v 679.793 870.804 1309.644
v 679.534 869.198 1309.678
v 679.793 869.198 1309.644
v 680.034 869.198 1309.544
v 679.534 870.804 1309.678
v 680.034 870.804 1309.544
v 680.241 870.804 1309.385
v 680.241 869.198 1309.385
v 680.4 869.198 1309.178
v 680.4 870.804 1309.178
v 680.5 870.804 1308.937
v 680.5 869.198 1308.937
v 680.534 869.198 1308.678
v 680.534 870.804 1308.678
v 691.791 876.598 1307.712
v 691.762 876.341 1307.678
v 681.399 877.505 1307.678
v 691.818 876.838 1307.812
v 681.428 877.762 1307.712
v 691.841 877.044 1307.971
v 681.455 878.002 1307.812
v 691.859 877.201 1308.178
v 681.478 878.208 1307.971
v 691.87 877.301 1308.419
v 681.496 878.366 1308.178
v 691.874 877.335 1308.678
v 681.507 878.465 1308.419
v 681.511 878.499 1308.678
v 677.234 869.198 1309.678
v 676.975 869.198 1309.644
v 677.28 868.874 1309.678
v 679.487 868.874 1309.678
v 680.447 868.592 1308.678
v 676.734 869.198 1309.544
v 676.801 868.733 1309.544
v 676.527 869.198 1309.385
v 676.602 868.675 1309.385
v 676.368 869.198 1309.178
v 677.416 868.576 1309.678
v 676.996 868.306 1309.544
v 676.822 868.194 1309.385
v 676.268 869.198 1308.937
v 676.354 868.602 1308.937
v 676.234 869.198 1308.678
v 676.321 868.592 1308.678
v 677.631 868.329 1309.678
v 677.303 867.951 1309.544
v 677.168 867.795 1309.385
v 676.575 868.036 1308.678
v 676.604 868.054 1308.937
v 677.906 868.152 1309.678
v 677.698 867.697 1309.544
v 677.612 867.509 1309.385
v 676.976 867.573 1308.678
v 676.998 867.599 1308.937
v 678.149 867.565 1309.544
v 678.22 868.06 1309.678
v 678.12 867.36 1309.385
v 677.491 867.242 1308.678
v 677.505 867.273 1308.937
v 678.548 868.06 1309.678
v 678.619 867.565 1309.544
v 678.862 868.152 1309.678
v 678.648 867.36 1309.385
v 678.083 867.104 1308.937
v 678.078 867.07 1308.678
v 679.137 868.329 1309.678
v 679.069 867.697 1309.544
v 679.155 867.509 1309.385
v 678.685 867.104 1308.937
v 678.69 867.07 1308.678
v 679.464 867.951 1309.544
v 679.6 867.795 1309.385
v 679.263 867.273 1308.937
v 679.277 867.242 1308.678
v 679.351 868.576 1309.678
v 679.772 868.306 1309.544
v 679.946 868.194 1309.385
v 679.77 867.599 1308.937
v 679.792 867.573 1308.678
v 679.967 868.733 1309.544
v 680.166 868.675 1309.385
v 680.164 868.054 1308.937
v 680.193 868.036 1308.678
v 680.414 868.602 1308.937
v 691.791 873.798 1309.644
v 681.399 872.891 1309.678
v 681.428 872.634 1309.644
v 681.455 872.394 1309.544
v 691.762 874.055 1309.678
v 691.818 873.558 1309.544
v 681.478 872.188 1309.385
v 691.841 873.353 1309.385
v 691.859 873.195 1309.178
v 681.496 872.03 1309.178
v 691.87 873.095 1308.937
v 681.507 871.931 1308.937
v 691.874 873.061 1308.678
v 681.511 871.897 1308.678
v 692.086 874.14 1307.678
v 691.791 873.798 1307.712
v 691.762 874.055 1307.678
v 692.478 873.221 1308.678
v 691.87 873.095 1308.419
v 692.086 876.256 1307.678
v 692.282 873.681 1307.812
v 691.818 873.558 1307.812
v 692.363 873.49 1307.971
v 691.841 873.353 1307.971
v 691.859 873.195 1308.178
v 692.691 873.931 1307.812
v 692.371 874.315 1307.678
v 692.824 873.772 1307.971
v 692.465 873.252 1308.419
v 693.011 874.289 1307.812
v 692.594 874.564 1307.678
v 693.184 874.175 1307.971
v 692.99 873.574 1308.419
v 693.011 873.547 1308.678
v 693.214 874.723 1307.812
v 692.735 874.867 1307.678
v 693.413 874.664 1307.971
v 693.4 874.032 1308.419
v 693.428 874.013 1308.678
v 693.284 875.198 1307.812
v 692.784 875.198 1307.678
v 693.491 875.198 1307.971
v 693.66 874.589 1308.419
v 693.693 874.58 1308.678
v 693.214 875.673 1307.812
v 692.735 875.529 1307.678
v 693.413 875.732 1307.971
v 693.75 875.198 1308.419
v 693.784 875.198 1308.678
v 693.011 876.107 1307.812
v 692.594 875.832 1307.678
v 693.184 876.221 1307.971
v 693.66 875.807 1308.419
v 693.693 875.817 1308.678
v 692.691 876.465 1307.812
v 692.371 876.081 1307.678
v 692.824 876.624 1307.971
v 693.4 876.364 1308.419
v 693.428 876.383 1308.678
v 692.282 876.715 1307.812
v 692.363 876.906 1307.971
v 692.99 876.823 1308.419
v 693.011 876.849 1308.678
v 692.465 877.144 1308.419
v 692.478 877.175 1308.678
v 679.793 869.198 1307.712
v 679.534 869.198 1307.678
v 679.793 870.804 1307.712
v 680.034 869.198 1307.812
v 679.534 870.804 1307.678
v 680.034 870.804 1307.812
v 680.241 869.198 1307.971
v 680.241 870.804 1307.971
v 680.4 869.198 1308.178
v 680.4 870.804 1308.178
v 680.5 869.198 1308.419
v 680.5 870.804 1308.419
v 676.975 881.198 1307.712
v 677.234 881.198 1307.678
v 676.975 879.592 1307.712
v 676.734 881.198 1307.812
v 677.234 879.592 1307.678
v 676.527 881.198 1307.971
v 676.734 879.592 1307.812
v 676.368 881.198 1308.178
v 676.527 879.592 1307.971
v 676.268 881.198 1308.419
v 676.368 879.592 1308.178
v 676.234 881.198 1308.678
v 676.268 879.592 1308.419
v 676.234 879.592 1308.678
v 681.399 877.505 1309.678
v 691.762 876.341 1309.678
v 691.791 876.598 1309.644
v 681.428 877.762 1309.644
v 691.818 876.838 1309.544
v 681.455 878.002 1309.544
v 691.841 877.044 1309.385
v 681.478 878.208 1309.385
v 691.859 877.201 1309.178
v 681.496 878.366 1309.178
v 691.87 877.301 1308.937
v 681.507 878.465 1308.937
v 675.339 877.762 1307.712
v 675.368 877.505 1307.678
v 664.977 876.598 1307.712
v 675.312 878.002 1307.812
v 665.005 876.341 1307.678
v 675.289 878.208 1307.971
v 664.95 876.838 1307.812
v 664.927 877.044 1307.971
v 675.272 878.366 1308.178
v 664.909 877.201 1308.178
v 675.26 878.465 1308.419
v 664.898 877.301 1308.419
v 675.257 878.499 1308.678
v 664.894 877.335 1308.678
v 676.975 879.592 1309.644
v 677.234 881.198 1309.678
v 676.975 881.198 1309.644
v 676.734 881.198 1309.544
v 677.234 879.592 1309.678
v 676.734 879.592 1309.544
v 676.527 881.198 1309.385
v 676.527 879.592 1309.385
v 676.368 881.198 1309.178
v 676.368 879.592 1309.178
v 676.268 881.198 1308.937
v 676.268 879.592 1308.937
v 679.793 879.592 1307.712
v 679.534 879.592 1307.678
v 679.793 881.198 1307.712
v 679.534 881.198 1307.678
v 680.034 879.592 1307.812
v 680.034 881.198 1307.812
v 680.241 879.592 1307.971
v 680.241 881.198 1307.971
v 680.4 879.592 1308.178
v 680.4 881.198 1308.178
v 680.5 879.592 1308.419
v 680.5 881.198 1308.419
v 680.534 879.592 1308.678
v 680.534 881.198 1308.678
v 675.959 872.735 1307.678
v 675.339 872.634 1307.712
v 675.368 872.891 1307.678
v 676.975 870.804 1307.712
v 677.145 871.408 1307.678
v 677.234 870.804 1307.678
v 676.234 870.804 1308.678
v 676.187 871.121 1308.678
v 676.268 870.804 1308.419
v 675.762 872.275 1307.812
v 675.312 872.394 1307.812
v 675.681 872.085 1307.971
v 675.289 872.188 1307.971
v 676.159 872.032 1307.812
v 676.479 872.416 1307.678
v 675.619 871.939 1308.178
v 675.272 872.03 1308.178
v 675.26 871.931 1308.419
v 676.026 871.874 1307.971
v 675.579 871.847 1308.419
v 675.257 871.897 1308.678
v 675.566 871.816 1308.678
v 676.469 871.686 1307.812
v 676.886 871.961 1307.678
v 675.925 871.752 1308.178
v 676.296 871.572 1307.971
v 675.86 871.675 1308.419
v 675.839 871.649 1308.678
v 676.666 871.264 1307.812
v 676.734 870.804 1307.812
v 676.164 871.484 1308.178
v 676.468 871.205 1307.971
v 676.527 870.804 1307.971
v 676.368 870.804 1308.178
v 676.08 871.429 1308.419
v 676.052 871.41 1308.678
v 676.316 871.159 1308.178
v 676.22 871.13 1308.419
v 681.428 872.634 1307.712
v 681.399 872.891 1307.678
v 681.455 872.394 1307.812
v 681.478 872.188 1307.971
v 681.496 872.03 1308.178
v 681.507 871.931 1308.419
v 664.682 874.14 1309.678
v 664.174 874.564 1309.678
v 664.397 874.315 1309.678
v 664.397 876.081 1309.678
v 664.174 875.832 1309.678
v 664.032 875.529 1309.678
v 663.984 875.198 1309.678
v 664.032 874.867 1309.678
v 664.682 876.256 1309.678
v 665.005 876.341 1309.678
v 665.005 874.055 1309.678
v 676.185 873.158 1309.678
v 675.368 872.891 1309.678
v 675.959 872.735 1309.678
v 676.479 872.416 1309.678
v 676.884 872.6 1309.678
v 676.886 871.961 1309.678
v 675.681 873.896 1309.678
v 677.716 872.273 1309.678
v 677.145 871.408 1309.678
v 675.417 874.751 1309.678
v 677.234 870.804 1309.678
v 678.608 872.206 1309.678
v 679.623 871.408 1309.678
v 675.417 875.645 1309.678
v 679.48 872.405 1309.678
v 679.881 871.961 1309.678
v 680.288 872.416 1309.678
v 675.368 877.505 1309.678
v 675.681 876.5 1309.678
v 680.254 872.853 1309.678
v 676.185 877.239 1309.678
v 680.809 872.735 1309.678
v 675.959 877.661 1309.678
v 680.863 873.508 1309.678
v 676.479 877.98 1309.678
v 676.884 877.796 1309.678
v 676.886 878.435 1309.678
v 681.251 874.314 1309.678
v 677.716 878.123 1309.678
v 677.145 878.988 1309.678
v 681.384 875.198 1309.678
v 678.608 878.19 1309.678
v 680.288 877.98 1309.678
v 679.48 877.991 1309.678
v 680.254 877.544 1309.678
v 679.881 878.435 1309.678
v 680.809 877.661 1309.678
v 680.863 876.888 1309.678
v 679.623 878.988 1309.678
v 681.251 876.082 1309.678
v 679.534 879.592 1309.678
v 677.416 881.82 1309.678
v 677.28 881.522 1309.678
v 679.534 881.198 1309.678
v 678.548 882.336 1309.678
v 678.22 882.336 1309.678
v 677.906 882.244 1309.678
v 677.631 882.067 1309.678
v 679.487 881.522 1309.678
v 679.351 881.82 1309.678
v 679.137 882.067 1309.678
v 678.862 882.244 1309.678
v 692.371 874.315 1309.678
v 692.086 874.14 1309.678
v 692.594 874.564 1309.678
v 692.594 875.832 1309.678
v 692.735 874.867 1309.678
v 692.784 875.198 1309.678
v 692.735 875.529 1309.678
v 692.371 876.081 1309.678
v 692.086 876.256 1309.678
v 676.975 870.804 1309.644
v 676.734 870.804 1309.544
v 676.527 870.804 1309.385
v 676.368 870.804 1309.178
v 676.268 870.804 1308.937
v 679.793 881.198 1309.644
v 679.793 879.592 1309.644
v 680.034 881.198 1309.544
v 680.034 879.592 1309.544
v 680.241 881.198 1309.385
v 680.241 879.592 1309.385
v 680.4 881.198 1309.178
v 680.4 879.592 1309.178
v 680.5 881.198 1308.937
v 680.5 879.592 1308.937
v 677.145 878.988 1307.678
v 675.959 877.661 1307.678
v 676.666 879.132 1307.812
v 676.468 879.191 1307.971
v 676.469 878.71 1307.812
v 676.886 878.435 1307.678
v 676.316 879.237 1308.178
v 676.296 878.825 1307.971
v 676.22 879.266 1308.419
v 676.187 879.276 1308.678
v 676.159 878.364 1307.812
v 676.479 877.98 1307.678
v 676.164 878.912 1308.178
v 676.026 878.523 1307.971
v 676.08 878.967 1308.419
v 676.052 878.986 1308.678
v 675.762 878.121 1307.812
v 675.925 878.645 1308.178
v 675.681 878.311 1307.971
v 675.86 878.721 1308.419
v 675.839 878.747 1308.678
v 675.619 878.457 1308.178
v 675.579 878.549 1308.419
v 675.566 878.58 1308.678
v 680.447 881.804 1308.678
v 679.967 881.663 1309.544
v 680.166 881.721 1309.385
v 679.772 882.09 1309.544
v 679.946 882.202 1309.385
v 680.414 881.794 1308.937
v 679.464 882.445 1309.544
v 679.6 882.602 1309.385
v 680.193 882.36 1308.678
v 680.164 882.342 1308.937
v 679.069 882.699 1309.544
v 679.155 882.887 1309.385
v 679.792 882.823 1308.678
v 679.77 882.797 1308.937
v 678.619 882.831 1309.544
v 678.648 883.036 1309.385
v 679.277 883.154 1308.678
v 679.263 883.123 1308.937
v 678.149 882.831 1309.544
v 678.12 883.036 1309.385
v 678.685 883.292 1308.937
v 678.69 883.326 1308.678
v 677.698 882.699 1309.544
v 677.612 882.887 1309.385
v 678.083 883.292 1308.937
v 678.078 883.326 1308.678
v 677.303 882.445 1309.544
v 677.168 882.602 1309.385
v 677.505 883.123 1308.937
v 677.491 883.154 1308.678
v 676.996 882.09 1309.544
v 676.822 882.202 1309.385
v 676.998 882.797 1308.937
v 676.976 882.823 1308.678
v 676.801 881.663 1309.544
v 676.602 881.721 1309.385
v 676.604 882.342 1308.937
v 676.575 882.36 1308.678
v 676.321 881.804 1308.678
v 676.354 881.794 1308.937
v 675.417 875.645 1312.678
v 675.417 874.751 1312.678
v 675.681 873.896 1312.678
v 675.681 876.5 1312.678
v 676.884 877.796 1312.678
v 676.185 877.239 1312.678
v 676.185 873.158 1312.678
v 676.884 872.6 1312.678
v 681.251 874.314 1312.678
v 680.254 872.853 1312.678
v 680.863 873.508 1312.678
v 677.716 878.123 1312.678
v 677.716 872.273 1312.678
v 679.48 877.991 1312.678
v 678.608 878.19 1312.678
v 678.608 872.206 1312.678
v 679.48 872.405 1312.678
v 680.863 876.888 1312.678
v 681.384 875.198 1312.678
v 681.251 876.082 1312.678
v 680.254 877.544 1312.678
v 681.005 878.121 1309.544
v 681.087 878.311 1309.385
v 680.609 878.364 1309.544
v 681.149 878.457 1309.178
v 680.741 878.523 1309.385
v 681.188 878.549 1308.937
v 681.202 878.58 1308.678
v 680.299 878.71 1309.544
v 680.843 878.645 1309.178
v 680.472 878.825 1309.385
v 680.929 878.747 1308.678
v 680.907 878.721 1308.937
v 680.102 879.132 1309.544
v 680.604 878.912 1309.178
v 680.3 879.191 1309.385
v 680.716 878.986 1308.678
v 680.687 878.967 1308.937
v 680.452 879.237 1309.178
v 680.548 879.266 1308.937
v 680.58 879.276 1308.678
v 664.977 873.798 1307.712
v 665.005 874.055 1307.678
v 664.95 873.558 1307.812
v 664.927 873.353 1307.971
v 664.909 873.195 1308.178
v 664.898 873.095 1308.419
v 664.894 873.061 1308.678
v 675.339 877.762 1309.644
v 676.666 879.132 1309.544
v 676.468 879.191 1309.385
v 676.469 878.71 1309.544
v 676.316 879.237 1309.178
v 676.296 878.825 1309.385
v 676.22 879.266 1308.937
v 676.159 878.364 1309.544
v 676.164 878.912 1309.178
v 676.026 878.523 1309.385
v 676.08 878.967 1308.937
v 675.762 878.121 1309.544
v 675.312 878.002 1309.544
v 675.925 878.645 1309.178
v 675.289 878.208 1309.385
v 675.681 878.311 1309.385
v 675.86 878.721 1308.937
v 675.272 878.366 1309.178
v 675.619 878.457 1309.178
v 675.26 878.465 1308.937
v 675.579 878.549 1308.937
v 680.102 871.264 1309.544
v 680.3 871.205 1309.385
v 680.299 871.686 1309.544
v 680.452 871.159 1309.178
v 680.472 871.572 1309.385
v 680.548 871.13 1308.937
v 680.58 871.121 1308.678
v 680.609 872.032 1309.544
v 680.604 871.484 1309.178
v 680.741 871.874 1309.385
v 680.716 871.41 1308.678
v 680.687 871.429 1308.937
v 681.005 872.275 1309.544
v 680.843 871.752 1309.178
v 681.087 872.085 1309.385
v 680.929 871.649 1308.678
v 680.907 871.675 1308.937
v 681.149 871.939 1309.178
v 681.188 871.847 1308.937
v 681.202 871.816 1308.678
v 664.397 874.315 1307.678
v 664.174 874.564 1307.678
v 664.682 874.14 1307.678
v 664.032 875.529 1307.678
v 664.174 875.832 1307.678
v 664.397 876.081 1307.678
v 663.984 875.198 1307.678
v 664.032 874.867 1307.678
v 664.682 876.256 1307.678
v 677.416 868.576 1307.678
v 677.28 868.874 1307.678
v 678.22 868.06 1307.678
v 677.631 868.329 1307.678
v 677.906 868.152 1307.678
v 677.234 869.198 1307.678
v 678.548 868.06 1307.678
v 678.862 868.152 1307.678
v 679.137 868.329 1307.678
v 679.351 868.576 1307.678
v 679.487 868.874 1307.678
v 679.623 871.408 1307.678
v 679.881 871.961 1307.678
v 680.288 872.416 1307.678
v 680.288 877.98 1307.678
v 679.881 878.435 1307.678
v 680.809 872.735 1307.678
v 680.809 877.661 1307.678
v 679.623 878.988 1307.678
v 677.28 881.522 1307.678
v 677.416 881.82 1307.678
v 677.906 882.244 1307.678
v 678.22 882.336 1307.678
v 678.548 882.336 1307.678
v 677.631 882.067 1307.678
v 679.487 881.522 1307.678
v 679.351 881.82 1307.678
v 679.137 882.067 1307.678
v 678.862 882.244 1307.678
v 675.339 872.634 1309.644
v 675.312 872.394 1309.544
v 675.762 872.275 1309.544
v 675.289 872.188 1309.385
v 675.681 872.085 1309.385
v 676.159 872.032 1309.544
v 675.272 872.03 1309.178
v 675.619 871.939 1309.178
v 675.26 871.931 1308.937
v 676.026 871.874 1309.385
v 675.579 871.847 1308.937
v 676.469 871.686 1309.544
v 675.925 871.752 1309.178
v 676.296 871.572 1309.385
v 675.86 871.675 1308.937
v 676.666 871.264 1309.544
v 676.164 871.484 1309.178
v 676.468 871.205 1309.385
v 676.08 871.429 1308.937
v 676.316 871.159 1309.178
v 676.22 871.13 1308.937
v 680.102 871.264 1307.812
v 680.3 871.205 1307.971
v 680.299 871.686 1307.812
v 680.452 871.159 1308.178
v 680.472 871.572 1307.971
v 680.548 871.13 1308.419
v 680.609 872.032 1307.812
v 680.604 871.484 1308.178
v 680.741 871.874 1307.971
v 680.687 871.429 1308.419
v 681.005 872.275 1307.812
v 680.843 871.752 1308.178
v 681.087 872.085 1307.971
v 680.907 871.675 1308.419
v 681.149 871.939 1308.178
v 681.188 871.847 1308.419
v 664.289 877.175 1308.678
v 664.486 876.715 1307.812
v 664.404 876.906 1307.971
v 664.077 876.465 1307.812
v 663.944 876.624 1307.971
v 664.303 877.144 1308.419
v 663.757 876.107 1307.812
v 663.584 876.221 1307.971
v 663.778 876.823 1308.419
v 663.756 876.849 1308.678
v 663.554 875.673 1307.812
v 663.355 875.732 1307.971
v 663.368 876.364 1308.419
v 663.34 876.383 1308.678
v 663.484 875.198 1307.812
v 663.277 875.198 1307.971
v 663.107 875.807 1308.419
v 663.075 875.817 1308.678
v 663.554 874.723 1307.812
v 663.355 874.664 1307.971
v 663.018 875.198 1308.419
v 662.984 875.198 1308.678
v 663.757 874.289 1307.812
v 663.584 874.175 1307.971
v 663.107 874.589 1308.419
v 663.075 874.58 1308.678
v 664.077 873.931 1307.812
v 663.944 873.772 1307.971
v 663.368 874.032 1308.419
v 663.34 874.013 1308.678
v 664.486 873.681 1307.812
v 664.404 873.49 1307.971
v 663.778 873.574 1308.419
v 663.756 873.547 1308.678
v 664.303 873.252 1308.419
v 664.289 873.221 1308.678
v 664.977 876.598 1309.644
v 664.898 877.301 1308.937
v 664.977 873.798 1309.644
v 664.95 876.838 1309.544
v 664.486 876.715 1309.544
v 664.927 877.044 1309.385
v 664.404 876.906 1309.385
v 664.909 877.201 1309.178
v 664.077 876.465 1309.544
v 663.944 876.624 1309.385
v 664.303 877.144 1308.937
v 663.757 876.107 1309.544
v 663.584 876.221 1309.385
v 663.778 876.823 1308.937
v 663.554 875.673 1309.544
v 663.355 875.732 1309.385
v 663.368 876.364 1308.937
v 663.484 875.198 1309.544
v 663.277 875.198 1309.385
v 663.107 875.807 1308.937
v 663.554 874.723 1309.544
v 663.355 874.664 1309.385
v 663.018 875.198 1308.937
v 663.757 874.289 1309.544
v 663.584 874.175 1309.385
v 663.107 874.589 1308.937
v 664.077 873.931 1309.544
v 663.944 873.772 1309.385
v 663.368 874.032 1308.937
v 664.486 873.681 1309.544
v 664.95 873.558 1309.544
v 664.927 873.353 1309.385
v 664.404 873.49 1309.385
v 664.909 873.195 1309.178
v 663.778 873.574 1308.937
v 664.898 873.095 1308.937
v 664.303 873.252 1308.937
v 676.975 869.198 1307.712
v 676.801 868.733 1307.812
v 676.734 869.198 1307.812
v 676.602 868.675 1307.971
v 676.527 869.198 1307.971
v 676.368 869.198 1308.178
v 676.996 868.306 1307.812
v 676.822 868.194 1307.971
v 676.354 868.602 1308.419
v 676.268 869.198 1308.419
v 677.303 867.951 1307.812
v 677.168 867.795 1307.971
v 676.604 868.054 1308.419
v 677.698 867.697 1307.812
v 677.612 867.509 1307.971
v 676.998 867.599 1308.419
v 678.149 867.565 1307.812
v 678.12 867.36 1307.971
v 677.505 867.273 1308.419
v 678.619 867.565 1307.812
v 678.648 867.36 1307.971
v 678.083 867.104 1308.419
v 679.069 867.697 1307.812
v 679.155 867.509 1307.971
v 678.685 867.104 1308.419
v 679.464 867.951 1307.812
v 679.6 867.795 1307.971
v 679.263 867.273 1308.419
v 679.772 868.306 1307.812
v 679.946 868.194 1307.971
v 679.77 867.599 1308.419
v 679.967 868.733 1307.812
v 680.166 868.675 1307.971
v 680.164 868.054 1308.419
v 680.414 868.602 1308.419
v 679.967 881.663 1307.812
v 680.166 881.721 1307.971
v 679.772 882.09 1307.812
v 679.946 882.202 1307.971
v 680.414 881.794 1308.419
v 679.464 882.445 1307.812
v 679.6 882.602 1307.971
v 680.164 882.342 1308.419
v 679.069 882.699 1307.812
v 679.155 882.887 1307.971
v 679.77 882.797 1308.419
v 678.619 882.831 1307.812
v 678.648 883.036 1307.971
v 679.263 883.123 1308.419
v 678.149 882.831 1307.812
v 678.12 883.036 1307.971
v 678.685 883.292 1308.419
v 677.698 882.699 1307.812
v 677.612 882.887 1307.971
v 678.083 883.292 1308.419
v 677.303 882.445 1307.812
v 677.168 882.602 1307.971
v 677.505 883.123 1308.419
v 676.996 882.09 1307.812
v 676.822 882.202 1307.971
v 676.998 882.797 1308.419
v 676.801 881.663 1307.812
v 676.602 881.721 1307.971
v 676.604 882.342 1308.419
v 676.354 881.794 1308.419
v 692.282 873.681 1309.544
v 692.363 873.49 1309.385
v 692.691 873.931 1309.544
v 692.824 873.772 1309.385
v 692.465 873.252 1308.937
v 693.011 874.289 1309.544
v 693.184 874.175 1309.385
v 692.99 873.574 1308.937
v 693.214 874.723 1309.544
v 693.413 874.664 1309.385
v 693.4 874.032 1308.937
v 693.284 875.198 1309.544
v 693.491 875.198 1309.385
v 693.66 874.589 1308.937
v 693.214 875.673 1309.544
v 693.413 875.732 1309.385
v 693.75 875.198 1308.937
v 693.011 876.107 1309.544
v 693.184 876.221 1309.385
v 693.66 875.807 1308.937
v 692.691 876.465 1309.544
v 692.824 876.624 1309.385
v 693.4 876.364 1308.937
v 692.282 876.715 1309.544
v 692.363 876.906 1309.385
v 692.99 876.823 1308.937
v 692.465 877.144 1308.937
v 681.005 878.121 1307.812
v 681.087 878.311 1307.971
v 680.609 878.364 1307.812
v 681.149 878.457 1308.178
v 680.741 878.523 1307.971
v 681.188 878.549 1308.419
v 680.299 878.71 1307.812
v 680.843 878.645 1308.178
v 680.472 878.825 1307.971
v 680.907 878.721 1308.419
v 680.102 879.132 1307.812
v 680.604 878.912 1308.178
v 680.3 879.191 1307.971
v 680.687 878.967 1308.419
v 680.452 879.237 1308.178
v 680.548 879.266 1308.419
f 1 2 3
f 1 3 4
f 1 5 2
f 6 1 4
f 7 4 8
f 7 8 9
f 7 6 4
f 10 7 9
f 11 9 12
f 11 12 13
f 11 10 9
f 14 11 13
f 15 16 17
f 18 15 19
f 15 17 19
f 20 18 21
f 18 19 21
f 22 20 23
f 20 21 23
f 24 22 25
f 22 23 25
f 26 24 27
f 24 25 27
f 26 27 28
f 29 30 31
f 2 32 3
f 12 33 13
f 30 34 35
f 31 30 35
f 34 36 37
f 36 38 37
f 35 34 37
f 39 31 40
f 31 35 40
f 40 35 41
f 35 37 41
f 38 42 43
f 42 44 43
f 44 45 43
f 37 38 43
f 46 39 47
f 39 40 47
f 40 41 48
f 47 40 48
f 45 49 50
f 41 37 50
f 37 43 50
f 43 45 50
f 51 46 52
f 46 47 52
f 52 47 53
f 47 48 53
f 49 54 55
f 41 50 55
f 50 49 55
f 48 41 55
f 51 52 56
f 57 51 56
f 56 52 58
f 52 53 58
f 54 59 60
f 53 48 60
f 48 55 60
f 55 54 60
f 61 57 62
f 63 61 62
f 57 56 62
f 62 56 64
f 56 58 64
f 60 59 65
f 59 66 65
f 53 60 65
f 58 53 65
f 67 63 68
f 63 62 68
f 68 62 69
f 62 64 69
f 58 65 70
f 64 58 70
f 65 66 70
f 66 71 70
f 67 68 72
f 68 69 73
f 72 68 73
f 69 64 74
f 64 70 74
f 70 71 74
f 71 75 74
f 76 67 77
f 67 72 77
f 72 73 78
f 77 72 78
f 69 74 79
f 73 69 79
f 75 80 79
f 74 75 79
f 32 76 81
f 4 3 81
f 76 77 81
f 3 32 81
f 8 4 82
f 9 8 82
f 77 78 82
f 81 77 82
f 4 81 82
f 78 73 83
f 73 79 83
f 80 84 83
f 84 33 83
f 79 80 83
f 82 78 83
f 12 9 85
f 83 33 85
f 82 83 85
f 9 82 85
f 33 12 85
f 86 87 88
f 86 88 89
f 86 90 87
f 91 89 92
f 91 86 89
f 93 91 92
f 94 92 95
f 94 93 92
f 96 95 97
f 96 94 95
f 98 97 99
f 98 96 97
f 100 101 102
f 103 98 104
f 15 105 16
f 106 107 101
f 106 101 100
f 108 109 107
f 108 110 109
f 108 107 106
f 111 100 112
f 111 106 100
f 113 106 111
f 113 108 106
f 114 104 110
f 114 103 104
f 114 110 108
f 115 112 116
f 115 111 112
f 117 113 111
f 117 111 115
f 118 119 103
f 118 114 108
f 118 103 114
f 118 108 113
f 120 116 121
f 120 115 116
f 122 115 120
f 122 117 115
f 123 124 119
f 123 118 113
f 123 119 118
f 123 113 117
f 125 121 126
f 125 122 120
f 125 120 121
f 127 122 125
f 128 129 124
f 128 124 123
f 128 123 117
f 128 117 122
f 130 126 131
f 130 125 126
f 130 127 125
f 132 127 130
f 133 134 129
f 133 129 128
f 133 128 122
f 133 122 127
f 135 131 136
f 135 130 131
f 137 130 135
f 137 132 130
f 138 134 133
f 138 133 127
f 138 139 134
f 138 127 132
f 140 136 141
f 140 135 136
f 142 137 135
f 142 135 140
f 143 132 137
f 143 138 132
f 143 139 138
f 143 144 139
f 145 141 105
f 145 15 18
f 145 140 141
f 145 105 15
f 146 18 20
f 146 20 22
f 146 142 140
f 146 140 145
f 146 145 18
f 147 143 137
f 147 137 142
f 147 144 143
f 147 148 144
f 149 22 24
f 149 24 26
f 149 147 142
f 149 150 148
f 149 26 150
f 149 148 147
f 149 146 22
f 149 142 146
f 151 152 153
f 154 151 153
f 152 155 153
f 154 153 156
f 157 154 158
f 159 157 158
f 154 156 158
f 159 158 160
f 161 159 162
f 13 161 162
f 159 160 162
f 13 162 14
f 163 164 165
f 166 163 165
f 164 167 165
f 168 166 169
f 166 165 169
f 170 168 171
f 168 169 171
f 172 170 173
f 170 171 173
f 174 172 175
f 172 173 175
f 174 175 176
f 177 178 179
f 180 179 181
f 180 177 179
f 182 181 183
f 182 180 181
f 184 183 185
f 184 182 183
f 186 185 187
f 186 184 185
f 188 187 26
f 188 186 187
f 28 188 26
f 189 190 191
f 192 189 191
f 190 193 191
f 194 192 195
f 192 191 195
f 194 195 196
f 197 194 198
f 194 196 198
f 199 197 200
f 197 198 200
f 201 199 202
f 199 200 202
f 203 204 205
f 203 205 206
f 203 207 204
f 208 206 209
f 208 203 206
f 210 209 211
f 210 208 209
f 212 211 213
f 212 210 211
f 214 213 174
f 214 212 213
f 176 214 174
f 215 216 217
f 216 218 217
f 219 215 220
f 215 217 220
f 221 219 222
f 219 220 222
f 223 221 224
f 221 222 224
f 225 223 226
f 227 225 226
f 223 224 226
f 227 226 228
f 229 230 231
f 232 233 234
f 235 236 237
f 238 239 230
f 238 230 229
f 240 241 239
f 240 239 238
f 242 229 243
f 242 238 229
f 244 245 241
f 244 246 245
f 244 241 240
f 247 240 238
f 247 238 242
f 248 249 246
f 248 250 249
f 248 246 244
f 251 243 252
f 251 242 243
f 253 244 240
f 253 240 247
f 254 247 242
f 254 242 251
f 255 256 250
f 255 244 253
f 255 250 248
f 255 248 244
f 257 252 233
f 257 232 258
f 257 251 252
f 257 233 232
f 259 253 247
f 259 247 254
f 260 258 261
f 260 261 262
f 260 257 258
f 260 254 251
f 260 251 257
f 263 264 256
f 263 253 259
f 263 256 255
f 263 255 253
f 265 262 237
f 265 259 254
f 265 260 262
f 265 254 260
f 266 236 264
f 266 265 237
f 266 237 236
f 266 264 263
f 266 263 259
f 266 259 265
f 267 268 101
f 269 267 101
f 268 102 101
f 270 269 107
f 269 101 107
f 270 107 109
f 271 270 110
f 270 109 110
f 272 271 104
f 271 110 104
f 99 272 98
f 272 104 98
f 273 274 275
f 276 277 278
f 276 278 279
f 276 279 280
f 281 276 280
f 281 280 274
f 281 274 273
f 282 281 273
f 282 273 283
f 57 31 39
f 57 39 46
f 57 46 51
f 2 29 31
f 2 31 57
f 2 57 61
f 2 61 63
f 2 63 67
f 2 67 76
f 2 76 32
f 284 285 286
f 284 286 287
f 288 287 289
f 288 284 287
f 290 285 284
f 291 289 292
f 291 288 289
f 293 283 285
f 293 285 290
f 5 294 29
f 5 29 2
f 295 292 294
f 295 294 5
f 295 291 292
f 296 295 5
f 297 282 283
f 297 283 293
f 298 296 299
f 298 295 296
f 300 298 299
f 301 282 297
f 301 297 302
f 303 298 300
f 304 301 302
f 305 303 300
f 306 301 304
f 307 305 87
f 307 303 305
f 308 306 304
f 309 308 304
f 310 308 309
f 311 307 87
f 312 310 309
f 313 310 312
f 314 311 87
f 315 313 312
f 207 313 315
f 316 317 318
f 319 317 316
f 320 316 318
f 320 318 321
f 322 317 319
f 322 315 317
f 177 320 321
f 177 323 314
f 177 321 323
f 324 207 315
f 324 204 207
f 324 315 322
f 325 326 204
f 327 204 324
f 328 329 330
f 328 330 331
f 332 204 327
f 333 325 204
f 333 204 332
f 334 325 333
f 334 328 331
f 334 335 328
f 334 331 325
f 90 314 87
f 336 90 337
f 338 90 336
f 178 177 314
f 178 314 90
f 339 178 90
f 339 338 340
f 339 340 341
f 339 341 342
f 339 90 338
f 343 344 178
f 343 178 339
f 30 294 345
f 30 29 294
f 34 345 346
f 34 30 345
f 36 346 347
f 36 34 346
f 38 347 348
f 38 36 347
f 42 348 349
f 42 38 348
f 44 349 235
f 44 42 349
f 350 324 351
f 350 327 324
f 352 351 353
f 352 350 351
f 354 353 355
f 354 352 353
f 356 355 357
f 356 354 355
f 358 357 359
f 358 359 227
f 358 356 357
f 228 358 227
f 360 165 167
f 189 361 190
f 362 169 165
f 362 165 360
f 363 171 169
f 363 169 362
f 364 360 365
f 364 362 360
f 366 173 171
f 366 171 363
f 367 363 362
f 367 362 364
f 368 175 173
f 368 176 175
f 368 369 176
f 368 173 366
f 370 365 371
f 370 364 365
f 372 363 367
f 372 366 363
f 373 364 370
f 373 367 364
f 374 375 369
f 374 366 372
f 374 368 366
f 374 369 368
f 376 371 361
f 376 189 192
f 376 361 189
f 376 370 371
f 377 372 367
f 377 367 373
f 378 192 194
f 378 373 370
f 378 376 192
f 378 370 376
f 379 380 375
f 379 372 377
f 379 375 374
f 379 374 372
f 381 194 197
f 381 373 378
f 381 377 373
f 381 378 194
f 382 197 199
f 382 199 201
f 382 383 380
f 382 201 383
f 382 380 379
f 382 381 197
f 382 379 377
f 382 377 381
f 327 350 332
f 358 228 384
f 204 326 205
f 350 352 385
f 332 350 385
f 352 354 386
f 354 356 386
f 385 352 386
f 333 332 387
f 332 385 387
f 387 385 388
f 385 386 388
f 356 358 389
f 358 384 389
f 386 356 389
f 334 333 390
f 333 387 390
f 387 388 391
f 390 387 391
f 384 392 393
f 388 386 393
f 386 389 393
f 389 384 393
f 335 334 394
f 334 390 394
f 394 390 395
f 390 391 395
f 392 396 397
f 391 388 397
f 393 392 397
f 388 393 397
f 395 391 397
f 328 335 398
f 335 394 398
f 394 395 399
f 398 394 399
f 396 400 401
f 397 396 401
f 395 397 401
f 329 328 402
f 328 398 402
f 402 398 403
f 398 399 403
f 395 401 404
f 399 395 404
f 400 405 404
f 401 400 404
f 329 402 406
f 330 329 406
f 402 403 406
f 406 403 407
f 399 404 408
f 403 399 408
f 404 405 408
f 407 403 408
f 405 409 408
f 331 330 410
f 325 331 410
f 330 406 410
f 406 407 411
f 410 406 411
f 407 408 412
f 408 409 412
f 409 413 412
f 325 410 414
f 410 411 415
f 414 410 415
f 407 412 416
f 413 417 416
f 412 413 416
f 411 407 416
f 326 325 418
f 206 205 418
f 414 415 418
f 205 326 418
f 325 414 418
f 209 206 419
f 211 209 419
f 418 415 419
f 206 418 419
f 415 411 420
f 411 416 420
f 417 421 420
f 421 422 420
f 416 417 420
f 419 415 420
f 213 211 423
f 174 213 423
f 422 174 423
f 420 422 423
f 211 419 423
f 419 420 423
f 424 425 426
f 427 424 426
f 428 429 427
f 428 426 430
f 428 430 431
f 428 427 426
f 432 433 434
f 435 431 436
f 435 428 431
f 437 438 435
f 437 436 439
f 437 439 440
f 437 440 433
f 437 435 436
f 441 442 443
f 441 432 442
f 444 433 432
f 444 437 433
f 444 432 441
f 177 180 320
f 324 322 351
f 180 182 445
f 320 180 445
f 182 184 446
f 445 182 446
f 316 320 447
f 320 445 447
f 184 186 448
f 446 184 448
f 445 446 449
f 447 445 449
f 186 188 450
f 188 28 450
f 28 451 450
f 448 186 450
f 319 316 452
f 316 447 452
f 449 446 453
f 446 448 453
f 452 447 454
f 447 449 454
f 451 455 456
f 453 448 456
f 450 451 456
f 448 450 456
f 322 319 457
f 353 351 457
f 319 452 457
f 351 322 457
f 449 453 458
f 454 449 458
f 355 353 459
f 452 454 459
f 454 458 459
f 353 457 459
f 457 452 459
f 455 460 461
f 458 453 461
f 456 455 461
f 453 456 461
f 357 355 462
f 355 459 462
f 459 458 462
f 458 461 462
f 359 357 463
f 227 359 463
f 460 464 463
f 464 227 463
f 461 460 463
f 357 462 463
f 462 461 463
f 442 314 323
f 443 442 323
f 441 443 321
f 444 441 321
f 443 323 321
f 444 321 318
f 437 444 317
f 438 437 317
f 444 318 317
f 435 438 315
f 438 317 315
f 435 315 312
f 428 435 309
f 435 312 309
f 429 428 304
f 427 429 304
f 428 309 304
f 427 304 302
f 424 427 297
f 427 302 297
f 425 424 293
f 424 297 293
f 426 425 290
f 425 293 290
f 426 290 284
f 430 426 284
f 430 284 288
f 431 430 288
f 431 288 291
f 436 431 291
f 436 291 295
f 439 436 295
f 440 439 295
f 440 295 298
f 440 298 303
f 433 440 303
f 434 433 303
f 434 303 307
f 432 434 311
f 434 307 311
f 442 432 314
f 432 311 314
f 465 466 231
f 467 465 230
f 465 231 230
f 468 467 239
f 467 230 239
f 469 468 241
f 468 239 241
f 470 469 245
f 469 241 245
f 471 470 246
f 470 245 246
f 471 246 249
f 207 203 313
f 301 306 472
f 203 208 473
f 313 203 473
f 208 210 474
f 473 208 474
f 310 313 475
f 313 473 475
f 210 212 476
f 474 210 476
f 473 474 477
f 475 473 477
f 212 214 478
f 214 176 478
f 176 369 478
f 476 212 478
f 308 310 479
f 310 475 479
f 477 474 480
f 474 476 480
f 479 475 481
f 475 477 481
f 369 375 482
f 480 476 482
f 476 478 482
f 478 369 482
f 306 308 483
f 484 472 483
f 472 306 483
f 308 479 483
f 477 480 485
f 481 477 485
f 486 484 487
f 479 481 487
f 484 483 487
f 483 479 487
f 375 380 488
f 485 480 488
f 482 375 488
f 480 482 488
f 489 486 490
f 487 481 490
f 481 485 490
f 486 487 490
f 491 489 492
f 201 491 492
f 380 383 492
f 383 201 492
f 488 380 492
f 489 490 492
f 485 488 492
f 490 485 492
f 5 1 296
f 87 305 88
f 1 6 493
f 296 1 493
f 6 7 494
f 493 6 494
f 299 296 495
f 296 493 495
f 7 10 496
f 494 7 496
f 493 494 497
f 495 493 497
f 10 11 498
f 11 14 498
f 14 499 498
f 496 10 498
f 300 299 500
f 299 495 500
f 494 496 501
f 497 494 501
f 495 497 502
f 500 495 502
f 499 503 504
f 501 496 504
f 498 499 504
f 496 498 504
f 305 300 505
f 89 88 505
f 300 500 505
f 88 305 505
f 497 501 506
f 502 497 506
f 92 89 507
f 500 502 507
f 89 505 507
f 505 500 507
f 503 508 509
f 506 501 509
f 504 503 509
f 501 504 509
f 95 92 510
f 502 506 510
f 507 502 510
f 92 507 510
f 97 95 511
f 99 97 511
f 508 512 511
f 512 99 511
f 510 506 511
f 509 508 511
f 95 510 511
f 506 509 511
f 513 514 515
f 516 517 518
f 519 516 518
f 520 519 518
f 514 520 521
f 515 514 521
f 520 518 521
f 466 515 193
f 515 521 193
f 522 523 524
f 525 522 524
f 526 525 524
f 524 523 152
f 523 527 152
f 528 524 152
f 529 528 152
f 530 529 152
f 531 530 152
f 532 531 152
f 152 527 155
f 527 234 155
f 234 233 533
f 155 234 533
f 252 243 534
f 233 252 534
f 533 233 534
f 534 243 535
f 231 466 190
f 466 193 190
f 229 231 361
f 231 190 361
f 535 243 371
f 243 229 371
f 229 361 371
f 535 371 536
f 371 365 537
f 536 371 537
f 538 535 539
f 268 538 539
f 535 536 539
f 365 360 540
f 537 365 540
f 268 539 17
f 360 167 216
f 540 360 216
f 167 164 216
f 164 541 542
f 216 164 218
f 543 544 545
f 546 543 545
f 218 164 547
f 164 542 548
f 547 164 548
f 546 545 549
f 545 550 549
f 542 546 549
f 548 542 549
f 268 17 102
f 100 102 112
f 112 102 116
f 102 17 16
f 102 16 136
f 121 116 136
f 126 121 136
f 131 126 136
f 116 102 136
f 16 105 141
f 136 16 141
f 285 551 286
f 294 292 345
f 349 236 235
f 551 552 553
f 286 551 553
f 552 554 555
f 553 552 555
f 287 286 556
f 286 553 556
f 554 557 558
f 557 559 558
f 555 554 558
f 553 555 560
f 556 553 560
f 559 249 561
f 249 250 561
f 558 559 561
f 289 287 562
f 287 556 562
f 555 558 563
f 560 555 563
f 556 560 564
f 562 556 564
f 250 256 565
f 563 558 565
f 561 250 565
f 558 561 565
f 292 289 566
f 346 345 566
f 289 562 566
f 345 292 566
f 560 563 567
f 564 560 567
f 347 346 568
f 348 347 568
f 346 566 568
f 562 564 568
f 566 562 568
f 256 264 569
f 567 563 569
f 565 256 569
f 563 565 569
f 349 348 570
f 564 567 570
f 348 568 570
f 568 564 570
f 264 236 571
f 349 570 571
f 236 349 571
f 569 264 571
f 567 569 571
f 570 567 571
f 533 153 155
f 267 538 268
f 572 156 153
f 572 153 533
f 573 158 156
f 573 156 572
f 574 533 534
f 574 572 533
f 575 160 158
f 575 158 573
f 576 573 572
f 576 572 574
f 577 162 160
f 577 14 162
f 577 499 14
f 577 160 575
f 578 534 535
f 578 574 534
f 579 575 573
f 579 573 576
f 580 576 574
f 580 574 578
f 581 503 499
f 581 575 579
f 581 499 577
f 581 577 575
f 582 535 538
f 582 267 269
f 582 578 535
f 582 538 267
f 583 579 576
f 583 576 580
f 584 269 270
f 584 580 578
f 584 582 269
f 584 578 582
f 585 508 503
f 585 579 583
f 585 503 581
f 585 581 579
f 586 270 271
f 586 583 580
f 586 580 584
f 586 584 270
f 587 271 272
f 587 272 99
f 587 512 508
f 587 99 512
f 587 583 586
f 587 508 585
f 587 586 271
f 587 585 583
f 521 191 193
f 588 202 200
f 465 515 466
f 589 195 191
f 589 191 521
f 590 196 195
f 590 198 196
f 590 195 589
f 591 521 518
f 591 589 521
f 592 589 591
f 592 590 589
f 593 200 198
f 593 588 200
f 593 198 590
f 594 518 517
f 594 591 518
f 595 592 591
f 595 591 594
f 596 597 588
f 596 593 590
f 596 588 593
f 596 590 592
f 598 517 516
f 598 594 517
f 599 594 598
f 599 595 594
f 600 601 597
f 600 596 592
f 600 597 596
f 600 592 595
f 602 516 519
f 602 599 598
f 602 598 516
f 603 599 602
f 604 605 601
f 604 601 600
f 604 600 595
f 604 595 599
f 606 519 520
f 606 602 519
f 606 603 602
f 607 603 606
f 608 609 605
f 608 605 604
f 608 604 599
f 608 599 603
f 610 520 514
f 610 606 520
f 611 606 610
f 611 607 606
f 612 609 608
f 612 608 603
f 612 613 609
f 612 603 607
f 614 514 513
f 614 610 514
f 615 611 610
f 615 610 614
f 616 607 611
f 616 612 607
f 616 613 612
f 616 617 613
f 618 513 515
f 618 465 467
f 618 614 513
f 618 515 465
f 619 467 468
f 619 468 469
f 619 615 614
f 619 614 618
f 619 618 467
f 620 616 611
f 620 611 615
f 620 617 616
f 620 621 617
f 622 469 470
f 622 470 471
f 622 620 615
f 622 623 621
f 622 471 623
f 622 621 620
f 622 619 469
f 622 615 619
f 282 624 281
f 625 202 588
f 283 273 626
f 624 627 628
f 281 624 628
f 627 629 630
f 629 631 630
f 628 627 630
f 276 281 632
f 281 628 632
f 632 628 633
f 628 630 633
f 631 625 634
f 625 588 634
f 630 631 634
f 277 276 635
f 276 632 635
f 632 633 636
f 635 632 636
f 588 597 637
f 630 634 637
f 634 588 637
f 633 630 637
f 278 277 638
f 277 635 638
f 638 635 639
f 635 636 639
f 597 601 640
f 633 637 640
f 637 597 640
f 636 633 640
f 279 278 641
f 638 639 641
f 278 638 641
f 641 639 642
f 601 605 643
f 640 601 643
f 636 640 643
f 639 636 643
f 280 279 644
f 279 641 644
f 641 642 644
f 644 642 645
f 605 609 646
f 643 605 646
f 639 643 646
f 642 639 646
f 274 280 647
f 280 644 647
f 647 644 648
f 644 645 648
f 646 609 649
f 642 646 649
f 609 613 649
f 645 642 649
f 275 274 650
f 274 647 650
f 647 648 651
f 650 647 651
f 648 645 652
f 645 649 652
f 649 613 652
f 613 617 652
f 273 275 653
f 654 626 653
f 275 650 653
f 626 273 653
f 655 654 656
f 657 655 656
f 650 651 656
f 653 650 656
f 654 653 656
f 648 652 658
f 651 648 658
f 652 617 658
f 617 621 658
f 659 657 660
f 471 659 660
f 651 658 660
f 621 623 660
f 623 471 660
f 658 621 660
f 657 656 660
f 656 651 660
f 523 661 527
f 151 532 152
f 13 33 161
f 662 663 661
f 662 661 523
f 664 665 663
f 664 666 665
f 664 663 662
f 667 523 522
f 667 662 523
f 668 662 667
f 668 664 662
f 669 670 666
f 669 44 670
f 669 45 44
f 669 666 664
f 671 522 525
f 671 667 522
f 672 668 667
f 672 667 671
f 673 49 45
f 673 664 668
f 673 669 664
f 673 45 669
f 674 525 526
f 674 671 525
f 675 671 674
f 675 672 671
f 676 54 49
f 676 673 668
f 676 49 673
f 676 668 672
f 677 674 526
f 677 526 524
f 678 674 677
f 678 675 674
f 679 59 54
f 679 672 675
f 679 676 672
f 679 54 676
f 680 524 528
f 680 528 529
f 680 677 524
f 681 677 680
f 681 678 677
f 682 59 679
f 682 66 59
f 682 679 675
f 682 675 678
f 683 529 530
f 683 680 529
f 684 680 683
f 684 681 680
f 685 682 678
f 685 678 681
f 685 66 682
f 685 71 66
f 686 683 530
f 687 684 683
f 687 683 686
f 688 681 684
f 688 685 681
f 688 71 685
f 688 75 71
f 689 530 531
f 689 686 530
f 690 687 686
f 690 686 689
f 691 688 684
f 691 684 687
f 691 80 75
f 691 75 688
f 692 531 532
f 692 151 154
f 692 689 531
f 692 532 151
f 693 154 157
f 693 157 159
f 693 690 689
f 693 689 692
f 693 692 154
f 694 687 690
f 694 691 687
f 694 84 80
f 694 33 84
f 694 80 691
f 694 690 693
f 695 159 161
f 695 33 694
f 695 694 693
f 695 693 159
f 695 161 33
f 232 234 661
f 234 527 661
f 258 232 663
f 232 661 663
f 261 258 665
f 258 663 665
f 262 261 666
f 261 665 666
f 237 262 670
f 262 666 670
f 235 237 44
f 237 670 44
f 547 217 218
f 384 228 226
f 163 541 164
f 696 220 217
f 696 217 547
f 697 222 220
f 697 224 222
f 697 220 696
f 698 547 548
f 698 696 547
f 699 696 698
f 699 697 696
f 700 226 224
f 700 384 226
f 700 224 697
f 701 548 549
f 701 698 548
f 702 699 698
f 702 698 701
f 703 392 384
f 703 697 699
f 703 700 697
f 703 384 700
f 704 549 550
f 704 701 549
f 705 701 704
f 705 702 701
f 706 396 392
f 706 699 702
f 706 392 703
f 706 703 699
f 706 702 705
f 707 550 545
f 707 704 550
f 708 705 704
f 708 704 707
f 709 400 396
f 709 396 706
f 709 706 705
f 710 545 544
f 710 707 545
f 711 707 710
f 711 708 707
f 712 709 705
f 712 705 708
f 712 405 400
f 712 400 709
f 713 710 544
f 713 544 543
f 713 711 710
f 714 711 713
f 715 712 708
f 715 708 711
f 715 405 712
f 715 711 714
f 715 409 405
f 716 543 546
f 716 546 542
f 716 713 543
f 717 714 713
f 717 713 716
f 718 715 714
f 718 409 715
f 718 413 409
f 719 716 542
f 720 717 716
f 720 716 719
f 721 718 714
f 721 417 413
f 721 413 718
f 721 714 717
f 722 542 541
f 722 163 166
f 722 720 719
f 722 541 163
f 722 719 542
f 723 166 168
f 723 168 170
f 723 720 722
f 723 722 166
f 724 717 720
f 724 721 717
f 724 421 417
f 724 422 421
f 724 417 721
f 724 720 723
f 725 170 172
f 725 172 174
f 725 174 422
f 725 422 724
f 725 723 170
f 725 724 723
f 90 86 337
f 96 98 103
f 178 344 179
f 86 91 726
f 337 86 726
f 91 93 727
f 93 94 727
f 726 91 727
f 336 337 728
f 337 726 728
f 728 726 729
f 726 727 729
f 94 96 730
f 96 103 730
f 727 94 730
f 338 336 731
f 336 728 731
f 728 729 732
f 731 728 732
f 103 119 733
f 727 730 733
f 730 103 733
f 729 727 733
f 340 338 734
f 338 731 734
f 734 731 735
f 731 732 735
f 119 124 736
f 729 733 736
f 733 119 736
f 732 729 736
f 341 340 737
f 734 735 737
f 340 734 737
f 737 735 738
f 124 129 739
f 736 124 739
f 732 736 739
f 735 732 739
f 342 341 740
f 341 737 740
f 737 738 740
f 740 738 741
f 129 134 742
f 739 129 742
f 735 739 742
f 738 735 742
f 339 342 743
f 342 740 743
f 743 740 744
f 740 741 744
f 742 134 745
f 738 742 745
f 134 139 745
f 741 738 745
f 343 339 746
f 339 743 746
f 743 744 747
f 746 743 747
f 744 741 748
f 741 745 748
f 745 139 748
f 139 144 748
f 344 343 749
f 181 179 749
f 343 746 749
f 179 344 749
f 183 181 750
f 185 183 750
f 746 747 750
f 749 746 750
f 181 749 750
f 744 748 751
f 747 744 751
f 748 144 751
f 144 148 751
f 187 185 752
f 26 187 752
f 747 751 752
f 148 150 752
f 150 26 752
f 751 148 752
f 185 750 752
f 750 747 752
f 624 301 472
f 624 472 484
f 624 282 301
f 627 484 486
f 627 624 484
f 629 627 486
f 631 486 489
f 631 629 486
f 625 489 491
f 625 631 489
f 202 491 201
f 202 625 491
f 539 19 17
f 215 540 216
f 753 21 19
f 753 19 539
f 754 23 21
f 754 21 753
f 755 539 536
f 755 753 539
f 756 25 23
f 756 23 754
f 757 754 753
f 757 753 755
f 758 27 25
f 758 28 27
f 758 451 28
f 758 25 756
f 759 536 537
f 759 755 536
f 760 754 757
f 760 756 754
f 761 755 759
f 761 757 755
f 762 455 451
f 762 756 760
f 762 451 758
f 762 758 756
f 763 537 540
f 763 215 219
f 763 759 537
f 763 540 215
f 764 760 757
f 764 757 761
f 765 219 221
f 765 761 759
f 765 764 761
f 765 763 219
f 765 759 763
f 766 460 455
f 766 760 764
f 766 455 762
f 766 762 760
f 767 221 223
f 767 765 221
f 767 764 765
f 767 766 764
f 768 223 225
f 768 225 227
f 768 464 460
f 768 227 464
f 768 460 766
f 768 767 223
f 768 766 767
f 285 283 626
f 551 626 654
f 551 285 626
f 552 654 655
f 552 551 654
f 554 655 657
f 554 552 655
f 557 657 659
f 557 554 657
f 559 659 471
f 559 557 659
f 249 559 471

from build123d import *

# Parameters (mm, degrees)
BOSS_EXTRUDE1_DEPTH = 2
SKETCH2_R           = 3
BOSS_EXTRUDE2_DEPTH = 3
FILLET1_R           = 1


with BuildPart() as part:
    # Sketch1 → Boss-Extrude1 (new body)
    with BuildSketch(Plane.XY.offset(1307.677843453)):
        with BuildLine():
            Line((676.233867879, 870.804107087), (676.233867879, 869.198049015))
            ThreePointArc((676.233867879, 869.198049015), (678.383867879, 867.048049015), (680.533867879, 869.198049015))
            Line((680.533867879, 869.198049015), (680.533867879, 870.804107087))
            ThreePointArc((680.533867879, 870.804107087), (680.81377857, 871.537219306), (681.511056106, 871.897229801))
            Line((681.511056106, 871.897229801), (691.873909071, 873.061490983))
            ThreePointArc((691.873909071, 873.061490983), (693.783867879, 875.198049016), (691.873909071, 877.334607048))
            Line((691.873909071, 877.334607048), (681.511056106, 878.49886823))
            ThreePointArc((681.511056106, 878.49886823), (680.81377857, 878.858878725), (680.533867879, 879.591990944))
            Line((680.533867879, 879.591990944), (680.533867879, 881.198049015))
            ThreePointArc((680.533867879, 881.198049015), (678.383867879, 883.348049015), (676.233867879, 881.198049015))
            Line((676.233867879, 881.198049015), (676.233867879, 879.591990944))
            ThreePointArc((676.233867879, 879.591990944), (675.953957188, 878.858878725), (675.256679652, 878.49886823))
            Line((675.256679652, 878.49886823), (664.893826687, 877.334607048))
            ThreePointArc((664.893826687, 877.334607048), (662.983867879, 875.198049015), (664.893826687, 873.061490983))
            Line((664.893826687, 873.061490983), (675.256679652, 871.897229801))
            ThreePointArc((675.256679652, 871.897229801), (675.953957188, 871.537219305), (676.233867879, 870.804107087))
        make_face()
    extrude(amount=BOSS_EXTRUDE1_DEPTH)

    # Sketch2 → Boss-Extrude2 (add)
    with BuildSketch(Plane.XY.offset(1309.677843453)):
        with Locations((678.383867879, 875.198049015)):
            Circle(SKETCH2_R)
    extrude(amount=BOSS_EXTRUDE2_DEPTH)

    # Fillet1
    fillet1_edges = [part.edges().sort_by_distance(p)[0] for p in [
        (675.953957188, 878.858878725, 1307.677843453),
        (676.233867879, 880.39501998, 1307.677843453),
        (678.383867879, 883.348049015, 1307.677843453),
        (680.533867879, 880.39501998, 1307.677843453),
        (680.81377857, 878.858878725, 1307.677843453),
        (686.692482589, 877.916737639, 1307.677843453),
        (693.783867879, 875.198049016, 1307.677843453),
        (686.692482589, 872.479360392, 1307.677843453),
        (680.81377857, 871.537219306, 1307.677843453),
        (680.533867879, 870.001078051, 1307.677843453),
        (678.383867879, 867.048049015, 1307.677843453),
        (676.233867879, 870.001078051, 1307.677843453),
        (675.953957188, 871.537219305, 1307.677843453),
        (670.075253169, 872.479360392, 1307.677843453),
        (662.983867879, 875.198049015, 1307.677843453),
        (670.075253169, 877.916737639, 1307.677843453),
        (675.953957188, 878.858878725, 1309.677843453),
        (676.233867879, 880.39501998, 1309.677843453),
        (678.383867879, 883.348049015, 1309.677843453),
        (680.533867879, 880.39501998, 1309.677843453),
        (680.81377857, 878.858878725, 1309.677843453),
        (686.692482589, 877.916737639, 1309.677843453),
        (693.783867879, 875.198049016, 1309.677843453),
        (686.692482589, 872.479360392, 1309.677843453),
        (680.81377857, 871.537219306, 1309.677843453),
        (680.533867879, 870.001078051, 1309.677843453),
        (678.383867879, 867.048049015, 1309.677843453),
        (676.233867879, 870.001078051, 1309.677843453),
        (675.953957188, 871.537219305, 1309.677843453),
        (670.075253169, 872.479360392, 1309.677843453),
        (662.983867879, 875.198049015, 1309.677843453),
        (670.075253169, 877.916737639, 1309.677843453),
    ]]
    fillet(fillet1_edges, radius=FILLET1_R - 0.0001)  # a hair under: the kernel refuses the full size


solid = part.part
